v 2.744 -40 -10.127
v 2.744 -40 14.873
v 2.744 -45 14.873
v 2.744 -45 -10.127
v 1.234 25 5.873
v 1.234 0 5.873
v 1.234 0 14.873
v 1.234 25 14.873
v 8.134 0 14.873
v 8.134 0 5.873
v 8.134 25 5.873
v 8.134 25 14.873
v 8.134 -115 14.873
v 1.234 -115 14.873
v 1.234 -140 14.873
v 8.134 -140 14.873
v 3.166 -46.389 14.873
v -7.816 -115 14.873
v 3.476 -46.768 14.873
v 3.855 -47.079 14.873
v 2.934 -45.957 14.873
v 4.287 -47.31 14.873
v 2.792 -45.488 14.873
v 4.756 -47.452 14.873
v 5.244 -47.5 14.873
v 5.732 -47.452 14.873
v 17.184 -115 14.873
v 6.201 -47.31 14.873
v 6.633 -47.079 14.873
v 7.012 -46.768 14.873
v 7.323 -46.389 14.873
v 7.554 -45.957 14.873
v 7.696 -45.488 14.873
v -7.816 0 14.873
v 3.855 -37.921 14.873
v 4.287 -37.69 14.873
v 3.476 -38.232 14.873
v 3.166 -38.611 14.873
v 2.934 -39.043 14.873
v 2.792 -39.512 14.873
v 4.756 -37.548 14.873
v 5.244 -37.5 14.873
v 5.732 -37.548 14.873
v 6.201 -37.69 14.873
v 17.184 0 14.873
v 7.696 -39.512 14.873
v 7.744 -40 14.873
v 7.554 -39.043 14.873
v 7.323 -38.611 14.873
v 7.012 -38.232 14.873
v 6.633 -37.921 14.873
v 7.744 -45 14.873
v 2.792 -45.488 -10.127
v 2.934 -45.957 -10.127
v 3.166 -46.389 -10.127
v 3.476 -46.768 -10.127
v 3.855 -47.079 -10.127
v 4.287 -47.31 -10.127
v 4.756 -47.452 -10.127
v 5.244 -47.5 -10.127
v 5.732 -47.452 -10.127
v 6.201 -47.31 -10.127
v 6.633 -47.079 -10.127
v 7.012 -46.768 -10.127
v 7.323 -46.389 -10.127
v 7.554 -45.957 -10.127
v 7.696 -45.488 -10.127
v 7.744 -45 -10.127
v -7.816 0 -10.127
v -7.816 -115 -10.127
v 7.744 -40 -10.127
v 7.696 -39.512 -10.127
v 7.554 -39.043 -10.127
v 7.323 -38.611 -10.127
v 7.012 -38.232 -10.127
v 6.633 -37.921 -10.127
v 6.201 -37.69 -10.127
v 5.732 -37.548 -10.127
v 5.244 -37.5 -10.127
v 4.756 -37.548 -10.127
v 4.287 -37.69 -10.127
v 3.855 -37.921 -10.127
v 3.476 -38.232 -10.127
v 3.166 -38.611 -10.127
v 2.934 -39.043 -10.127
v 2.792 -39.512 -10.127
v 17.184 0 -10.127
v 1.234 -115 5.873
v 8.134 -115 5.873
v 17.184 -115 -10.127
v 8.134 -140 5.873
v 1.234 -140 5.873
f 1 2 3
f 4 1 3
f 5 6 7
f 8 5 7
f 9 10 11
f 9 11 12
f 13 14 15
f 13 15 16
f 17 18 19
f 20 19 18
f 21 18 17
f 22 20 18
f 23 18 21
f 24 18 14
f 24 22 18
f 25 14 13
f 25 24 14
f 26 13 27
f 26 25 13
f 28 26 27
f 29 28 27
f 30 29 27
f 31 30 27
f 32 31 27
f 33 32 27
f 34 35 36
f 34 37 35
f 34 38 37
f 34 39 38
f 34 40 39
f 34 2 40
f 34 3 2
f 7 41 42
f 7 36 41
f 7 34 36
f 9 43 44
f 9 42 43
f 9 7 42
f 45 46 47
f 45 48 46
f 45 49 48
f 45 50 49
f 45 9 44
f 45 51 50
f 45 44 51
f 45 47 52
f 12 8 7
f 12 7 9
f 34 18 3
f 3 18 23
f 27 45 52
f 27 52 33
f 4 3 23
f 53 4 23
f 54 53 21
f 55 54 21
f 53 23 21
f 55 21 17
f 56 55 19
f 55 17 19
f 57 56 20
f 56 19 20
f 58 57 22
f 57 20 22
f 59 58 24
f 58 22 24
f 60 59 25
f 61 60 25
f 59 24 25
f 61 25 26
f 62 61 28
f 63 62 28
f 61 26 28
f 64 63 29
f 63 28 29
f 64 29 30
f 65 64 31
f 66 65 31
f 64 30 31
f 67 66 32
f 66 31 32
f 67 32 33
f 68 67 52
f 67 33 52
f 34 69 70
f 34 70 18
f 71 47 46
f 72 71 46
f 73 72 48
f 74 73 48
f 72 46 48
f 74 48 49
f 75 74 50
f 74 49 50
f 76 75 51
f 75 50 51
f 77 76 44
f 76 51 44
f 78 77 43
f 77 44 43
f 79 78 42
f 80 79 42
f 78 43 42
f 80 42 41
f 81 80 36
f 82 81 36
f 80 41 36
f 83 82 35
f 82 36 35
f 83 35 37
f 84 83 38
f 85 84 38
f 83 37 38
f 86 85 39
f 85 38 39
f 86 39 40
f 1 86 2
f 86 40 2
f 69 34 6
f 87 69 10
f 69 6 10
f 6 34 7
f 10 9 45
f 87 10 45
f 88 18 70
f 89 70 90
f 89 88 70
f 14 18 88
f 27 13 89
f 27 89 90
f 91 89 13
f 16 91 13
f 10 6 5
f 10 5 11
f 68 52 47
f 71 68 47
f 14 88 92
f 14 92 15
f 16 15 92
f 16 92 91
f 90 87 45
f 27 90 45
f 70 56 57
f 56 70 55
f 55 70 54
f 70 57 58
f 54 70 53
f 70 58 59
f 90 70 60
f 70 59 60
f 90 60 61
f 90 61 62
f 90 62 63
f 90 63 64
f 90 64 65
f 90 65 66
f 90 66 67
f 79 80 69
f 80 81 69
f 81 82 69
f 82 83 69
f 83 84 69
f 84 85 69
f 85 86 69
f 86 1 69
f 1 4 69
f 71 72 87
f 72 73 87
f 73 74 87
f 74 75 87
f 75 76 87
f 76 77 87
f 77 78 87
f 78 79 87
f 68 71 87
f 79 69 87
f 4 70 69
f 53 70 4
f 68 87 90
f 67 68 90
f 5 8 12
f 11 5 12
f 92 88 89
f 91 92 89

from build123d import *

# Parameters (mm, degrees)
F0_W          = 25
F0_H          = 25
F1_DEPTH      = 115
F2_W          = 6.9
F2_H          = 9
F3_DEPTH      = 25
F3_DEPTH_BACK = 140
F5_DEPTH      = 26


with BuildPart() as f1:
    # F0 (on Front) → F1 (new body)
    with BuildSketch(Plane.XZ):
        with Locations((4.684485, 2.3731)):
            Rectangle(F0_W, F0_H)
    extrude(amount=F1_DEPTH)

    # F2 (on face) → F3 (join, two sides)
    with BuildSketch(Plane.XZ.offset(115)) as f3_sk:
        with Locations((4.684485, 10.3731)):
            Rectangle(F2_W, F2_H)
    extrude(amount=F3_DEPTH)
    extrude(f3_sk.sketch, amount=-F3_DEPTH_BACK)

    # F4 (on face) → F5 (cut)
    with BuildSketch(Plane.XY.offset(14.8731)):
        with BuildLine():
            ThreePointArc((7.744195, -40), (5.244195, -37.5), (2.744195, -40))
            Line((2.744195, -40), (2.744195, -45))
            ThreePointArc((2.744195, -45), (5.244195, -47.5), (7.744195, -45))
            Line((7.744195, -45), (7.744195, -40))
        make_face()
    extrude(amount=-F5_DEPTH, mode=Mode.SUBTRACT)


solid = f1.part
